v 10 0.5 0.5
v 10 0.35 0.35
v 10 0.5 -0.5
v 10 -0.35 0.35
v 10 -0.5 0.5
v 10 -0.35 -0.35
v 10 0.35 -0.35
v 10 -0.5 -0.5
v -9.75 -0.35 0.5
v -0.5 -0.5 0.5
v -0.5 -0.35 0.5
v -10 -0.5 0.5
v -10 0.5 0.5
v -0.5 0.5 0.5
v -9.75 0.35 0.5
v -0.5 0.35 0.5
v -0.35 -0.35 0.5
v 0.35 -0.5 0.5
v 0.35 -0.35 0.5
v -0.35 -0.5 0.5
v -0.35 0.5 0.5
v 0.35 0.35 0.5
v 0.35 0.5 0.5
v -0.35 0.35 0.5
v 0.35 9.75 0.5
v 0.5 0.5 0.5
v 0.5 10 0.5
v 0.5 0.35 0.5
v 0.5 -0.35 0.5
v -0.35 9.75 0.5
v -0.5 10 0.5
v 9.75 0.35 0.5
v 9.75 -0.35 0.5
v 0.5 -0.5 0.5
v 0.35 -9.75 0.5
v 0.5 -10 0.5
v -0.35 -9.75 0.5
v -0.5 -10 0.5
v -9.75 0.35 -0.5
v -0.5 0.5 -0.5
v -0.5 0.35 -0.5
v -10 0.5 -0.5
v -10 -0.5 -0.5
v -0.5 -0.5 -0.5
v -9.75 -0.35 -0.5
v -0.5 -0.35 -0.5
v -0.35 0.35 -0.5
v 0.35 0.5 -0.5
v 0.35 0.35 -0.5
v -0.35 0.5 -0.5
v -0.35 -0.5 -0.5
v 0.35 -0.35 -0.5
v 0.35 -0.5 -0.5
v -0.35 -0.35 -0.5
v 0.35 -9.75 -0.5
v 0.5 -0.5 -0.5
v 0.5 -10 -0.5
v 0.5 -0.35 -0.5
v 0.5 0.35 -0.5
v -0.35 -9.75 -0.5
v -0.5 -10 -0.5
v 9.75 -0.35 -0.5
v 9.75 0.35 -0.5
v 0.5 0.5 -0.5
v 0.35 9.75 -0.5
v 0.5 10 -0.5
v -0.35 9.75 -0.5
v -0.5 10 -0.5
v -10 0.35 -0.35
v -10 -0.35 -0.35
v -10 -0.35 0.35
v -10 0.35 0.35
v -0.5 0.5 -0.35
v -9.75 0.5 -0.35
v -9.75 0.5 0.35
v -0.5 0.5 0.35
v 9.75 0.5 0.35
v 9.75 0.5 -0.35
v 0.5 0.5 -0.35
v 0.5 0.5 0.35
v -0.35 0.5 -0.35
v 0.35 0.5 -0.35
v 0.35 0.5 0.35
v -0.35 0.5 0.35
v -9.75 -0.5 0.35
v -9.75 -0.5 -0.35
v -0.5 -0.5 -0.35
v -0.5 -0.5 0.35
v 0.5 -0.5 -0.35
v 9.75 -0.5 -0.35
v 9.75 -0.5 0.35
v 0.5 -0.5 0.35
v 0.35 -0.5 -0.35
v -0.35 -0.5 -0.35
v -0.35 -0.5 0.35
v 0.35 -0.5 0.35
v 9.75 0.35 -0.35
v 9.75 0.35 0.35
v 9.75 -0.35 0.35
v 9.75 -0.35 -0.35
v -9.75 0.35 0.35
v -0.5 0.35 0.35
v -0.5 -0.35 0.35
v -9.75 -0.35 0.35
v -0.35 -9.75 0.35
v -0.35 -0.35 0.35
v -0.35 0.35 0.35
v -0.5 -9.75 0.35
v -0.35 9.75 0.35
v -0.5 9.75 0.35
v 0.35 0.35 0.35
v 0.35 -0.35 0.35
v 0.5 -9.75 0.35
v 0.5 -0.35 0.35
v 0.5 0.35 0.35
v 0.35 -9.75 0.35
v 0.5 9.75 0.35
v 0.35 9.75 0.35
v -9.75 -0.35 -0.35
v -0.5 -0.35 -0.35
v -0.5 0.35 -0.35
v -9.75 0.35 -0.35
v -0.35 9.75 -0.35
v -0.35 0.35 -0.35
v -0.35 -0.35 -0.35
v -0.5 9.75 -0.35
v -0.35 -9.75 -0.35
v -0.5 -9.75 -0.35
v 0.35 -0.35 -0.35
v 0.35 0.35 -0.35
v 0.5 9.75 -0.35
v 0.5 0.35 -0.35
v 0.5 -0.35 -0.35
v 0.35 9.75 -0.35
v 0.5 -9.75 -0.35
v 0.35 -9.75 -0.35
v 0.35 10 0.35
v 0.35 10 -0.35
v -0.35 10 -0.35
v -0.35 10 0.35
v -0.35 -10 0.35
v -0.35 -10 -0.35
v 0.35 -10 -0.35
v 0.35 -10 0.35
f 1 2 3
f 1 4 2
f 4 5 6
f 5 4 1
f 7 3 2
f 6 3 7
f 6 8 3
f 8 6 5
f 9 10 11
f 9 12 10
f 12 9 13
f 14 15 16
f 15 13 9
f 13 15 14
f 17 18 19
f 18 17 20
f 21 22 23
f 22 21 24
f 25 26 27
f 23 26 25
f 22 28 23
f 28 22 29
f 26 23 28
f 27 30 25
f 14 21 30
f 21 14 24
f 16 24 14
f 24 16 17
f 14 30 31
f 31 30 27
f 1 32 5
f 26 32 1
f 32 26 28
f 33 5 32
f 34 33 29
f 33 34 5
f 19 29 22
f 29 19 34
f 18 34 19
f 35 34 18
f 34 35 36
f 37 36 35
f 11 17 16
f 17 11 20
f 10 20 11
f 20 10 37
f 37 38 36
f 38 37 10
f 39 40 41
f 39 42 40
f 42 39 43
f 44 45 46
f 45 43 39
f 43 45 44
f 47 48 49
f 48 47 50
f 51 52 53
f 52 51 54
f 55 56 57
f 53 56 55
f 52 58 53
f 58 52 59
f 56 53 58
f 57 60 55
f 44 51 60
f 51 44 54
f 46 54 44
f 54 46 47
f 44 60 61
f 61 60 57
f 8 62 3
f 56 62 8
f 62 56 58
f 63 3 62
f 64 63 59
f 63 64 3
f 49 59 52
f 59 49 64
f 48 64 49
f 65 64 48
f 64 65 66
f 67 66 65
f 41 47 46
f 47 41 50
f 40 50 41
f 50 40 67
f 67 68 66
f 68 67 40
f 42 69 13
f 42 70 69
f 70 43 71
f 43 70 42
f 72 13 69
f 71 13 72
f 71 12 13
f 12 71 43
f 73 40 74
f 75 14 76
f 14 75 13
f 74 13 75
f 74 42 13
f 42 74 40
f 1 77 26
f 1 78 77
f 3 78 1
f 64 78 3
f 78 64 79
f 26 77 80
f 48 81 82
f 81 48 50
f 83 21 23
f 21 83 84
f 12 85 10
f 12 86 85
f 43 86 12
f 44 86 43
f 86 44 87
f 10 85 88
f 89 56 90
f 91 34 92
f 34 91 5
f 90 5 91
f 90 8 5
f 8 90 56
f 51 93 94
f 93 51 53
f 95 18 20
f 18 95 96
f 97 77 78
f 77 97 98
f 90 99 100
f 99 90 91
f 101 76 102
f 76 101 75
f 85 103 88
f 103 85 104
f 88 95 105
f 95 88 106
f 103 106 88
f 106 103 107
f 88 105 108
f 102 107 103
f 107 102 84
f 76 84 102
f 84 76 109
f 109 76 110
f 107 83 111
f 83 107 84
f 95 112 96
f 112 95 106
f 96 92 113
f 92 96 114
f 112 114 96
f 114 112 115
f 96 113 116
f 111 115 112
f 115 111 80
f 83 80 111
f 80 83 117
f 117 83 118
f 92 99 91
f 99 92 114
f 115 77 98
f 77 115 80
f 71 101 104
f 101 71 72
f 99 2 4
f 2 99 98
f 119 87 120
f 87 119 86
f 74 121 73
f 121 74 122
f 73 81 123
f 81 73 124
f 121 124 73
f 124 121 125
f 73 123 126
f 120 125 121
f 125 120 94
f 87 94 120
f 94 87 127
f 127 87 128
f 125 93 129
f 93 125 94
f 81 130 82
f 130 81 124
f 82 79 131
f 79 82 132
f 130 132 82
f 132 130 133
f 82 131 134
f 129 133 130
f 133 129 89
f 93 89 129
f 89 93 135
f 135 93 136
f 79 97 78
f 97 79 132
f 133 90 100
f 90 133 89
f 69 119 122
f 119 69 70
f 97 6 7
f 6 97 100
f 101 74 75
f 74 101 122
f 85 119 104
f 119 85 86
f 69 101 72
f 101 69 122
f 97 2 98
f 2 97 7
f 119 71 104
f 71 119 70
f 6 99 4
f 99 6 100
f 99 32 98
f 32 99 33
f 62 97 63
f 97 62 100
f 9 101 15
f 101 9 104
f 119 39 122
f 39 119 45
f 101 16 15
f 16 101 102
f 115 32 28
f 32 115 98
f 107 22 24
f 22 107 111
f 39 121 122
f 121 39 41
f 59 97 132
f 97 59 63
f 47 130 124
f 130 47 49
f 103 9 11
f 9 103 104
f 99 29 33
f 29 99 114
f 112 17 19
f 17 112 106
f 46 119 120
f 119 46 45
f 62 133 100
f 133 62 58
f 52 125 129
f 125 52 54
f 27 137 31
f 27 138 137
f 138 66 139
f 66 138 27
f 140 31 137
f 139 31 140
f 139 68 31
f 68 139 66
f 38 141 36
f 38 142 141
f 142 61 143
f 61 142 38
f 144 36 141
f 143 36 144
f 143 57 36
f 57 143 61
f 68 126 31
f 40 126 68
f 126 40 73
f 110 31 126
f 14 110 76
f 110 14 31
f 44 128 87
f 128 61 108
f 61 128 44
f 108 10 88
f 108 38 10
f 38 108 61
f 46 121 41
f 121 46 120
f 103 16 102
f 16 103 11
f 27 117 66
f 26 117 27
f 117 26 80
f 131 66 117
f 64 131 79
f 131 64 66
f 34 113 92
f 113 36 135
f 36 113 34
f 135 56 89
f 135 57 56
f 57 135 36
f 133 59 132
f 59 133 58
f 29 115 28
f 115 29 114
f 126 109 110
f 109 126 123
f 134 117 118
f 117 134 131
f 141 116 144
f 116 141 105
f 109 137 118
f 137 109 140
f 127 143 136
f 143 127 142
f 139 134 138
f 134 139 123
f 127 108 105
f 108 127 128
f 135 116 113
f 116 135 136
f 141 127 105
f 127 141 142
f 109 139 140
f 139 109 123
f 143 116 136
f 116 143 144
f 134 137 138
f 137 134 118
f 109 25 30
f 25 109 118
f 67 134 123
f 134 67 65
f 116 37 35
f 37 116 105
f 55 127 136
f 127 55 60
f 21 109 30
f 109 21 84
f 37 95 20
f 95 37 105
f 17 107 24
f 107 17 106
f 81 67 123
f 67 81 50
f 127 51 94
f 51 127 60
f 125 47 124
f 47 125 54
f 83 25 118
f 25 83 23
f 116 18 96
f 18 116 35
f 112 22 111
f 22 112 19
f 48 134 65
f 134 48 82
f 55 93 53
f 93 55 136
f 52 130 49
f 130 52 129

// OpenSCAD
/**
This code is for creating the arms for QUAD
**/

cubeOut = [20,1,1];
cubeInA = [19.5,2,0.7];
cubeInB = [21, 0.7, 0.7];
cubeInC = [19.5, 0.7, 2];
for(i = [0: 90: 360]){
    union(){
    rotate([0,0,i]){
	difference(){
		cube(size =cubeOut,center = true);

		cube(size = cubeInA,center = true);
		cube(size = cubeInB, center = true);
		cube(size = cubeInC, center = true);
	}
}
}
}




/////////////////////////////////////////
/**
height = 2;
radius = 5;
numberOfCircleFace = 20;
for(i = [0: 90: 360]){
rotate([0,0,i]){
translate([0,0,height]){
translate([10,0,0]){
    
    difference(){
    rotate_extrude( $fn = 100){
        translate([5, 0, 0]){
                circle(r = 0.5, center = true, $fn = 100);
        }
    }
    
        rotate_extrude( $fn = 100){
        translate([4.9, 0, 0]){
                circle(r = 0.5, center = true, $fn = 100);
        }
    }

    
    rotate_extrude( $fn =100){
        translate([4.5,0,0]){
            square(1, center = true);
        }
    }
}
}
    
    /**
    difference(){
        
    circle(r = radius, center = true, $fn = numberOfCircleFace);
    circle(r = 4, center = true, $fn= numberOfCircleFace);
        }
//////////////////////////////
        
    }  
}
}**/
    


    
